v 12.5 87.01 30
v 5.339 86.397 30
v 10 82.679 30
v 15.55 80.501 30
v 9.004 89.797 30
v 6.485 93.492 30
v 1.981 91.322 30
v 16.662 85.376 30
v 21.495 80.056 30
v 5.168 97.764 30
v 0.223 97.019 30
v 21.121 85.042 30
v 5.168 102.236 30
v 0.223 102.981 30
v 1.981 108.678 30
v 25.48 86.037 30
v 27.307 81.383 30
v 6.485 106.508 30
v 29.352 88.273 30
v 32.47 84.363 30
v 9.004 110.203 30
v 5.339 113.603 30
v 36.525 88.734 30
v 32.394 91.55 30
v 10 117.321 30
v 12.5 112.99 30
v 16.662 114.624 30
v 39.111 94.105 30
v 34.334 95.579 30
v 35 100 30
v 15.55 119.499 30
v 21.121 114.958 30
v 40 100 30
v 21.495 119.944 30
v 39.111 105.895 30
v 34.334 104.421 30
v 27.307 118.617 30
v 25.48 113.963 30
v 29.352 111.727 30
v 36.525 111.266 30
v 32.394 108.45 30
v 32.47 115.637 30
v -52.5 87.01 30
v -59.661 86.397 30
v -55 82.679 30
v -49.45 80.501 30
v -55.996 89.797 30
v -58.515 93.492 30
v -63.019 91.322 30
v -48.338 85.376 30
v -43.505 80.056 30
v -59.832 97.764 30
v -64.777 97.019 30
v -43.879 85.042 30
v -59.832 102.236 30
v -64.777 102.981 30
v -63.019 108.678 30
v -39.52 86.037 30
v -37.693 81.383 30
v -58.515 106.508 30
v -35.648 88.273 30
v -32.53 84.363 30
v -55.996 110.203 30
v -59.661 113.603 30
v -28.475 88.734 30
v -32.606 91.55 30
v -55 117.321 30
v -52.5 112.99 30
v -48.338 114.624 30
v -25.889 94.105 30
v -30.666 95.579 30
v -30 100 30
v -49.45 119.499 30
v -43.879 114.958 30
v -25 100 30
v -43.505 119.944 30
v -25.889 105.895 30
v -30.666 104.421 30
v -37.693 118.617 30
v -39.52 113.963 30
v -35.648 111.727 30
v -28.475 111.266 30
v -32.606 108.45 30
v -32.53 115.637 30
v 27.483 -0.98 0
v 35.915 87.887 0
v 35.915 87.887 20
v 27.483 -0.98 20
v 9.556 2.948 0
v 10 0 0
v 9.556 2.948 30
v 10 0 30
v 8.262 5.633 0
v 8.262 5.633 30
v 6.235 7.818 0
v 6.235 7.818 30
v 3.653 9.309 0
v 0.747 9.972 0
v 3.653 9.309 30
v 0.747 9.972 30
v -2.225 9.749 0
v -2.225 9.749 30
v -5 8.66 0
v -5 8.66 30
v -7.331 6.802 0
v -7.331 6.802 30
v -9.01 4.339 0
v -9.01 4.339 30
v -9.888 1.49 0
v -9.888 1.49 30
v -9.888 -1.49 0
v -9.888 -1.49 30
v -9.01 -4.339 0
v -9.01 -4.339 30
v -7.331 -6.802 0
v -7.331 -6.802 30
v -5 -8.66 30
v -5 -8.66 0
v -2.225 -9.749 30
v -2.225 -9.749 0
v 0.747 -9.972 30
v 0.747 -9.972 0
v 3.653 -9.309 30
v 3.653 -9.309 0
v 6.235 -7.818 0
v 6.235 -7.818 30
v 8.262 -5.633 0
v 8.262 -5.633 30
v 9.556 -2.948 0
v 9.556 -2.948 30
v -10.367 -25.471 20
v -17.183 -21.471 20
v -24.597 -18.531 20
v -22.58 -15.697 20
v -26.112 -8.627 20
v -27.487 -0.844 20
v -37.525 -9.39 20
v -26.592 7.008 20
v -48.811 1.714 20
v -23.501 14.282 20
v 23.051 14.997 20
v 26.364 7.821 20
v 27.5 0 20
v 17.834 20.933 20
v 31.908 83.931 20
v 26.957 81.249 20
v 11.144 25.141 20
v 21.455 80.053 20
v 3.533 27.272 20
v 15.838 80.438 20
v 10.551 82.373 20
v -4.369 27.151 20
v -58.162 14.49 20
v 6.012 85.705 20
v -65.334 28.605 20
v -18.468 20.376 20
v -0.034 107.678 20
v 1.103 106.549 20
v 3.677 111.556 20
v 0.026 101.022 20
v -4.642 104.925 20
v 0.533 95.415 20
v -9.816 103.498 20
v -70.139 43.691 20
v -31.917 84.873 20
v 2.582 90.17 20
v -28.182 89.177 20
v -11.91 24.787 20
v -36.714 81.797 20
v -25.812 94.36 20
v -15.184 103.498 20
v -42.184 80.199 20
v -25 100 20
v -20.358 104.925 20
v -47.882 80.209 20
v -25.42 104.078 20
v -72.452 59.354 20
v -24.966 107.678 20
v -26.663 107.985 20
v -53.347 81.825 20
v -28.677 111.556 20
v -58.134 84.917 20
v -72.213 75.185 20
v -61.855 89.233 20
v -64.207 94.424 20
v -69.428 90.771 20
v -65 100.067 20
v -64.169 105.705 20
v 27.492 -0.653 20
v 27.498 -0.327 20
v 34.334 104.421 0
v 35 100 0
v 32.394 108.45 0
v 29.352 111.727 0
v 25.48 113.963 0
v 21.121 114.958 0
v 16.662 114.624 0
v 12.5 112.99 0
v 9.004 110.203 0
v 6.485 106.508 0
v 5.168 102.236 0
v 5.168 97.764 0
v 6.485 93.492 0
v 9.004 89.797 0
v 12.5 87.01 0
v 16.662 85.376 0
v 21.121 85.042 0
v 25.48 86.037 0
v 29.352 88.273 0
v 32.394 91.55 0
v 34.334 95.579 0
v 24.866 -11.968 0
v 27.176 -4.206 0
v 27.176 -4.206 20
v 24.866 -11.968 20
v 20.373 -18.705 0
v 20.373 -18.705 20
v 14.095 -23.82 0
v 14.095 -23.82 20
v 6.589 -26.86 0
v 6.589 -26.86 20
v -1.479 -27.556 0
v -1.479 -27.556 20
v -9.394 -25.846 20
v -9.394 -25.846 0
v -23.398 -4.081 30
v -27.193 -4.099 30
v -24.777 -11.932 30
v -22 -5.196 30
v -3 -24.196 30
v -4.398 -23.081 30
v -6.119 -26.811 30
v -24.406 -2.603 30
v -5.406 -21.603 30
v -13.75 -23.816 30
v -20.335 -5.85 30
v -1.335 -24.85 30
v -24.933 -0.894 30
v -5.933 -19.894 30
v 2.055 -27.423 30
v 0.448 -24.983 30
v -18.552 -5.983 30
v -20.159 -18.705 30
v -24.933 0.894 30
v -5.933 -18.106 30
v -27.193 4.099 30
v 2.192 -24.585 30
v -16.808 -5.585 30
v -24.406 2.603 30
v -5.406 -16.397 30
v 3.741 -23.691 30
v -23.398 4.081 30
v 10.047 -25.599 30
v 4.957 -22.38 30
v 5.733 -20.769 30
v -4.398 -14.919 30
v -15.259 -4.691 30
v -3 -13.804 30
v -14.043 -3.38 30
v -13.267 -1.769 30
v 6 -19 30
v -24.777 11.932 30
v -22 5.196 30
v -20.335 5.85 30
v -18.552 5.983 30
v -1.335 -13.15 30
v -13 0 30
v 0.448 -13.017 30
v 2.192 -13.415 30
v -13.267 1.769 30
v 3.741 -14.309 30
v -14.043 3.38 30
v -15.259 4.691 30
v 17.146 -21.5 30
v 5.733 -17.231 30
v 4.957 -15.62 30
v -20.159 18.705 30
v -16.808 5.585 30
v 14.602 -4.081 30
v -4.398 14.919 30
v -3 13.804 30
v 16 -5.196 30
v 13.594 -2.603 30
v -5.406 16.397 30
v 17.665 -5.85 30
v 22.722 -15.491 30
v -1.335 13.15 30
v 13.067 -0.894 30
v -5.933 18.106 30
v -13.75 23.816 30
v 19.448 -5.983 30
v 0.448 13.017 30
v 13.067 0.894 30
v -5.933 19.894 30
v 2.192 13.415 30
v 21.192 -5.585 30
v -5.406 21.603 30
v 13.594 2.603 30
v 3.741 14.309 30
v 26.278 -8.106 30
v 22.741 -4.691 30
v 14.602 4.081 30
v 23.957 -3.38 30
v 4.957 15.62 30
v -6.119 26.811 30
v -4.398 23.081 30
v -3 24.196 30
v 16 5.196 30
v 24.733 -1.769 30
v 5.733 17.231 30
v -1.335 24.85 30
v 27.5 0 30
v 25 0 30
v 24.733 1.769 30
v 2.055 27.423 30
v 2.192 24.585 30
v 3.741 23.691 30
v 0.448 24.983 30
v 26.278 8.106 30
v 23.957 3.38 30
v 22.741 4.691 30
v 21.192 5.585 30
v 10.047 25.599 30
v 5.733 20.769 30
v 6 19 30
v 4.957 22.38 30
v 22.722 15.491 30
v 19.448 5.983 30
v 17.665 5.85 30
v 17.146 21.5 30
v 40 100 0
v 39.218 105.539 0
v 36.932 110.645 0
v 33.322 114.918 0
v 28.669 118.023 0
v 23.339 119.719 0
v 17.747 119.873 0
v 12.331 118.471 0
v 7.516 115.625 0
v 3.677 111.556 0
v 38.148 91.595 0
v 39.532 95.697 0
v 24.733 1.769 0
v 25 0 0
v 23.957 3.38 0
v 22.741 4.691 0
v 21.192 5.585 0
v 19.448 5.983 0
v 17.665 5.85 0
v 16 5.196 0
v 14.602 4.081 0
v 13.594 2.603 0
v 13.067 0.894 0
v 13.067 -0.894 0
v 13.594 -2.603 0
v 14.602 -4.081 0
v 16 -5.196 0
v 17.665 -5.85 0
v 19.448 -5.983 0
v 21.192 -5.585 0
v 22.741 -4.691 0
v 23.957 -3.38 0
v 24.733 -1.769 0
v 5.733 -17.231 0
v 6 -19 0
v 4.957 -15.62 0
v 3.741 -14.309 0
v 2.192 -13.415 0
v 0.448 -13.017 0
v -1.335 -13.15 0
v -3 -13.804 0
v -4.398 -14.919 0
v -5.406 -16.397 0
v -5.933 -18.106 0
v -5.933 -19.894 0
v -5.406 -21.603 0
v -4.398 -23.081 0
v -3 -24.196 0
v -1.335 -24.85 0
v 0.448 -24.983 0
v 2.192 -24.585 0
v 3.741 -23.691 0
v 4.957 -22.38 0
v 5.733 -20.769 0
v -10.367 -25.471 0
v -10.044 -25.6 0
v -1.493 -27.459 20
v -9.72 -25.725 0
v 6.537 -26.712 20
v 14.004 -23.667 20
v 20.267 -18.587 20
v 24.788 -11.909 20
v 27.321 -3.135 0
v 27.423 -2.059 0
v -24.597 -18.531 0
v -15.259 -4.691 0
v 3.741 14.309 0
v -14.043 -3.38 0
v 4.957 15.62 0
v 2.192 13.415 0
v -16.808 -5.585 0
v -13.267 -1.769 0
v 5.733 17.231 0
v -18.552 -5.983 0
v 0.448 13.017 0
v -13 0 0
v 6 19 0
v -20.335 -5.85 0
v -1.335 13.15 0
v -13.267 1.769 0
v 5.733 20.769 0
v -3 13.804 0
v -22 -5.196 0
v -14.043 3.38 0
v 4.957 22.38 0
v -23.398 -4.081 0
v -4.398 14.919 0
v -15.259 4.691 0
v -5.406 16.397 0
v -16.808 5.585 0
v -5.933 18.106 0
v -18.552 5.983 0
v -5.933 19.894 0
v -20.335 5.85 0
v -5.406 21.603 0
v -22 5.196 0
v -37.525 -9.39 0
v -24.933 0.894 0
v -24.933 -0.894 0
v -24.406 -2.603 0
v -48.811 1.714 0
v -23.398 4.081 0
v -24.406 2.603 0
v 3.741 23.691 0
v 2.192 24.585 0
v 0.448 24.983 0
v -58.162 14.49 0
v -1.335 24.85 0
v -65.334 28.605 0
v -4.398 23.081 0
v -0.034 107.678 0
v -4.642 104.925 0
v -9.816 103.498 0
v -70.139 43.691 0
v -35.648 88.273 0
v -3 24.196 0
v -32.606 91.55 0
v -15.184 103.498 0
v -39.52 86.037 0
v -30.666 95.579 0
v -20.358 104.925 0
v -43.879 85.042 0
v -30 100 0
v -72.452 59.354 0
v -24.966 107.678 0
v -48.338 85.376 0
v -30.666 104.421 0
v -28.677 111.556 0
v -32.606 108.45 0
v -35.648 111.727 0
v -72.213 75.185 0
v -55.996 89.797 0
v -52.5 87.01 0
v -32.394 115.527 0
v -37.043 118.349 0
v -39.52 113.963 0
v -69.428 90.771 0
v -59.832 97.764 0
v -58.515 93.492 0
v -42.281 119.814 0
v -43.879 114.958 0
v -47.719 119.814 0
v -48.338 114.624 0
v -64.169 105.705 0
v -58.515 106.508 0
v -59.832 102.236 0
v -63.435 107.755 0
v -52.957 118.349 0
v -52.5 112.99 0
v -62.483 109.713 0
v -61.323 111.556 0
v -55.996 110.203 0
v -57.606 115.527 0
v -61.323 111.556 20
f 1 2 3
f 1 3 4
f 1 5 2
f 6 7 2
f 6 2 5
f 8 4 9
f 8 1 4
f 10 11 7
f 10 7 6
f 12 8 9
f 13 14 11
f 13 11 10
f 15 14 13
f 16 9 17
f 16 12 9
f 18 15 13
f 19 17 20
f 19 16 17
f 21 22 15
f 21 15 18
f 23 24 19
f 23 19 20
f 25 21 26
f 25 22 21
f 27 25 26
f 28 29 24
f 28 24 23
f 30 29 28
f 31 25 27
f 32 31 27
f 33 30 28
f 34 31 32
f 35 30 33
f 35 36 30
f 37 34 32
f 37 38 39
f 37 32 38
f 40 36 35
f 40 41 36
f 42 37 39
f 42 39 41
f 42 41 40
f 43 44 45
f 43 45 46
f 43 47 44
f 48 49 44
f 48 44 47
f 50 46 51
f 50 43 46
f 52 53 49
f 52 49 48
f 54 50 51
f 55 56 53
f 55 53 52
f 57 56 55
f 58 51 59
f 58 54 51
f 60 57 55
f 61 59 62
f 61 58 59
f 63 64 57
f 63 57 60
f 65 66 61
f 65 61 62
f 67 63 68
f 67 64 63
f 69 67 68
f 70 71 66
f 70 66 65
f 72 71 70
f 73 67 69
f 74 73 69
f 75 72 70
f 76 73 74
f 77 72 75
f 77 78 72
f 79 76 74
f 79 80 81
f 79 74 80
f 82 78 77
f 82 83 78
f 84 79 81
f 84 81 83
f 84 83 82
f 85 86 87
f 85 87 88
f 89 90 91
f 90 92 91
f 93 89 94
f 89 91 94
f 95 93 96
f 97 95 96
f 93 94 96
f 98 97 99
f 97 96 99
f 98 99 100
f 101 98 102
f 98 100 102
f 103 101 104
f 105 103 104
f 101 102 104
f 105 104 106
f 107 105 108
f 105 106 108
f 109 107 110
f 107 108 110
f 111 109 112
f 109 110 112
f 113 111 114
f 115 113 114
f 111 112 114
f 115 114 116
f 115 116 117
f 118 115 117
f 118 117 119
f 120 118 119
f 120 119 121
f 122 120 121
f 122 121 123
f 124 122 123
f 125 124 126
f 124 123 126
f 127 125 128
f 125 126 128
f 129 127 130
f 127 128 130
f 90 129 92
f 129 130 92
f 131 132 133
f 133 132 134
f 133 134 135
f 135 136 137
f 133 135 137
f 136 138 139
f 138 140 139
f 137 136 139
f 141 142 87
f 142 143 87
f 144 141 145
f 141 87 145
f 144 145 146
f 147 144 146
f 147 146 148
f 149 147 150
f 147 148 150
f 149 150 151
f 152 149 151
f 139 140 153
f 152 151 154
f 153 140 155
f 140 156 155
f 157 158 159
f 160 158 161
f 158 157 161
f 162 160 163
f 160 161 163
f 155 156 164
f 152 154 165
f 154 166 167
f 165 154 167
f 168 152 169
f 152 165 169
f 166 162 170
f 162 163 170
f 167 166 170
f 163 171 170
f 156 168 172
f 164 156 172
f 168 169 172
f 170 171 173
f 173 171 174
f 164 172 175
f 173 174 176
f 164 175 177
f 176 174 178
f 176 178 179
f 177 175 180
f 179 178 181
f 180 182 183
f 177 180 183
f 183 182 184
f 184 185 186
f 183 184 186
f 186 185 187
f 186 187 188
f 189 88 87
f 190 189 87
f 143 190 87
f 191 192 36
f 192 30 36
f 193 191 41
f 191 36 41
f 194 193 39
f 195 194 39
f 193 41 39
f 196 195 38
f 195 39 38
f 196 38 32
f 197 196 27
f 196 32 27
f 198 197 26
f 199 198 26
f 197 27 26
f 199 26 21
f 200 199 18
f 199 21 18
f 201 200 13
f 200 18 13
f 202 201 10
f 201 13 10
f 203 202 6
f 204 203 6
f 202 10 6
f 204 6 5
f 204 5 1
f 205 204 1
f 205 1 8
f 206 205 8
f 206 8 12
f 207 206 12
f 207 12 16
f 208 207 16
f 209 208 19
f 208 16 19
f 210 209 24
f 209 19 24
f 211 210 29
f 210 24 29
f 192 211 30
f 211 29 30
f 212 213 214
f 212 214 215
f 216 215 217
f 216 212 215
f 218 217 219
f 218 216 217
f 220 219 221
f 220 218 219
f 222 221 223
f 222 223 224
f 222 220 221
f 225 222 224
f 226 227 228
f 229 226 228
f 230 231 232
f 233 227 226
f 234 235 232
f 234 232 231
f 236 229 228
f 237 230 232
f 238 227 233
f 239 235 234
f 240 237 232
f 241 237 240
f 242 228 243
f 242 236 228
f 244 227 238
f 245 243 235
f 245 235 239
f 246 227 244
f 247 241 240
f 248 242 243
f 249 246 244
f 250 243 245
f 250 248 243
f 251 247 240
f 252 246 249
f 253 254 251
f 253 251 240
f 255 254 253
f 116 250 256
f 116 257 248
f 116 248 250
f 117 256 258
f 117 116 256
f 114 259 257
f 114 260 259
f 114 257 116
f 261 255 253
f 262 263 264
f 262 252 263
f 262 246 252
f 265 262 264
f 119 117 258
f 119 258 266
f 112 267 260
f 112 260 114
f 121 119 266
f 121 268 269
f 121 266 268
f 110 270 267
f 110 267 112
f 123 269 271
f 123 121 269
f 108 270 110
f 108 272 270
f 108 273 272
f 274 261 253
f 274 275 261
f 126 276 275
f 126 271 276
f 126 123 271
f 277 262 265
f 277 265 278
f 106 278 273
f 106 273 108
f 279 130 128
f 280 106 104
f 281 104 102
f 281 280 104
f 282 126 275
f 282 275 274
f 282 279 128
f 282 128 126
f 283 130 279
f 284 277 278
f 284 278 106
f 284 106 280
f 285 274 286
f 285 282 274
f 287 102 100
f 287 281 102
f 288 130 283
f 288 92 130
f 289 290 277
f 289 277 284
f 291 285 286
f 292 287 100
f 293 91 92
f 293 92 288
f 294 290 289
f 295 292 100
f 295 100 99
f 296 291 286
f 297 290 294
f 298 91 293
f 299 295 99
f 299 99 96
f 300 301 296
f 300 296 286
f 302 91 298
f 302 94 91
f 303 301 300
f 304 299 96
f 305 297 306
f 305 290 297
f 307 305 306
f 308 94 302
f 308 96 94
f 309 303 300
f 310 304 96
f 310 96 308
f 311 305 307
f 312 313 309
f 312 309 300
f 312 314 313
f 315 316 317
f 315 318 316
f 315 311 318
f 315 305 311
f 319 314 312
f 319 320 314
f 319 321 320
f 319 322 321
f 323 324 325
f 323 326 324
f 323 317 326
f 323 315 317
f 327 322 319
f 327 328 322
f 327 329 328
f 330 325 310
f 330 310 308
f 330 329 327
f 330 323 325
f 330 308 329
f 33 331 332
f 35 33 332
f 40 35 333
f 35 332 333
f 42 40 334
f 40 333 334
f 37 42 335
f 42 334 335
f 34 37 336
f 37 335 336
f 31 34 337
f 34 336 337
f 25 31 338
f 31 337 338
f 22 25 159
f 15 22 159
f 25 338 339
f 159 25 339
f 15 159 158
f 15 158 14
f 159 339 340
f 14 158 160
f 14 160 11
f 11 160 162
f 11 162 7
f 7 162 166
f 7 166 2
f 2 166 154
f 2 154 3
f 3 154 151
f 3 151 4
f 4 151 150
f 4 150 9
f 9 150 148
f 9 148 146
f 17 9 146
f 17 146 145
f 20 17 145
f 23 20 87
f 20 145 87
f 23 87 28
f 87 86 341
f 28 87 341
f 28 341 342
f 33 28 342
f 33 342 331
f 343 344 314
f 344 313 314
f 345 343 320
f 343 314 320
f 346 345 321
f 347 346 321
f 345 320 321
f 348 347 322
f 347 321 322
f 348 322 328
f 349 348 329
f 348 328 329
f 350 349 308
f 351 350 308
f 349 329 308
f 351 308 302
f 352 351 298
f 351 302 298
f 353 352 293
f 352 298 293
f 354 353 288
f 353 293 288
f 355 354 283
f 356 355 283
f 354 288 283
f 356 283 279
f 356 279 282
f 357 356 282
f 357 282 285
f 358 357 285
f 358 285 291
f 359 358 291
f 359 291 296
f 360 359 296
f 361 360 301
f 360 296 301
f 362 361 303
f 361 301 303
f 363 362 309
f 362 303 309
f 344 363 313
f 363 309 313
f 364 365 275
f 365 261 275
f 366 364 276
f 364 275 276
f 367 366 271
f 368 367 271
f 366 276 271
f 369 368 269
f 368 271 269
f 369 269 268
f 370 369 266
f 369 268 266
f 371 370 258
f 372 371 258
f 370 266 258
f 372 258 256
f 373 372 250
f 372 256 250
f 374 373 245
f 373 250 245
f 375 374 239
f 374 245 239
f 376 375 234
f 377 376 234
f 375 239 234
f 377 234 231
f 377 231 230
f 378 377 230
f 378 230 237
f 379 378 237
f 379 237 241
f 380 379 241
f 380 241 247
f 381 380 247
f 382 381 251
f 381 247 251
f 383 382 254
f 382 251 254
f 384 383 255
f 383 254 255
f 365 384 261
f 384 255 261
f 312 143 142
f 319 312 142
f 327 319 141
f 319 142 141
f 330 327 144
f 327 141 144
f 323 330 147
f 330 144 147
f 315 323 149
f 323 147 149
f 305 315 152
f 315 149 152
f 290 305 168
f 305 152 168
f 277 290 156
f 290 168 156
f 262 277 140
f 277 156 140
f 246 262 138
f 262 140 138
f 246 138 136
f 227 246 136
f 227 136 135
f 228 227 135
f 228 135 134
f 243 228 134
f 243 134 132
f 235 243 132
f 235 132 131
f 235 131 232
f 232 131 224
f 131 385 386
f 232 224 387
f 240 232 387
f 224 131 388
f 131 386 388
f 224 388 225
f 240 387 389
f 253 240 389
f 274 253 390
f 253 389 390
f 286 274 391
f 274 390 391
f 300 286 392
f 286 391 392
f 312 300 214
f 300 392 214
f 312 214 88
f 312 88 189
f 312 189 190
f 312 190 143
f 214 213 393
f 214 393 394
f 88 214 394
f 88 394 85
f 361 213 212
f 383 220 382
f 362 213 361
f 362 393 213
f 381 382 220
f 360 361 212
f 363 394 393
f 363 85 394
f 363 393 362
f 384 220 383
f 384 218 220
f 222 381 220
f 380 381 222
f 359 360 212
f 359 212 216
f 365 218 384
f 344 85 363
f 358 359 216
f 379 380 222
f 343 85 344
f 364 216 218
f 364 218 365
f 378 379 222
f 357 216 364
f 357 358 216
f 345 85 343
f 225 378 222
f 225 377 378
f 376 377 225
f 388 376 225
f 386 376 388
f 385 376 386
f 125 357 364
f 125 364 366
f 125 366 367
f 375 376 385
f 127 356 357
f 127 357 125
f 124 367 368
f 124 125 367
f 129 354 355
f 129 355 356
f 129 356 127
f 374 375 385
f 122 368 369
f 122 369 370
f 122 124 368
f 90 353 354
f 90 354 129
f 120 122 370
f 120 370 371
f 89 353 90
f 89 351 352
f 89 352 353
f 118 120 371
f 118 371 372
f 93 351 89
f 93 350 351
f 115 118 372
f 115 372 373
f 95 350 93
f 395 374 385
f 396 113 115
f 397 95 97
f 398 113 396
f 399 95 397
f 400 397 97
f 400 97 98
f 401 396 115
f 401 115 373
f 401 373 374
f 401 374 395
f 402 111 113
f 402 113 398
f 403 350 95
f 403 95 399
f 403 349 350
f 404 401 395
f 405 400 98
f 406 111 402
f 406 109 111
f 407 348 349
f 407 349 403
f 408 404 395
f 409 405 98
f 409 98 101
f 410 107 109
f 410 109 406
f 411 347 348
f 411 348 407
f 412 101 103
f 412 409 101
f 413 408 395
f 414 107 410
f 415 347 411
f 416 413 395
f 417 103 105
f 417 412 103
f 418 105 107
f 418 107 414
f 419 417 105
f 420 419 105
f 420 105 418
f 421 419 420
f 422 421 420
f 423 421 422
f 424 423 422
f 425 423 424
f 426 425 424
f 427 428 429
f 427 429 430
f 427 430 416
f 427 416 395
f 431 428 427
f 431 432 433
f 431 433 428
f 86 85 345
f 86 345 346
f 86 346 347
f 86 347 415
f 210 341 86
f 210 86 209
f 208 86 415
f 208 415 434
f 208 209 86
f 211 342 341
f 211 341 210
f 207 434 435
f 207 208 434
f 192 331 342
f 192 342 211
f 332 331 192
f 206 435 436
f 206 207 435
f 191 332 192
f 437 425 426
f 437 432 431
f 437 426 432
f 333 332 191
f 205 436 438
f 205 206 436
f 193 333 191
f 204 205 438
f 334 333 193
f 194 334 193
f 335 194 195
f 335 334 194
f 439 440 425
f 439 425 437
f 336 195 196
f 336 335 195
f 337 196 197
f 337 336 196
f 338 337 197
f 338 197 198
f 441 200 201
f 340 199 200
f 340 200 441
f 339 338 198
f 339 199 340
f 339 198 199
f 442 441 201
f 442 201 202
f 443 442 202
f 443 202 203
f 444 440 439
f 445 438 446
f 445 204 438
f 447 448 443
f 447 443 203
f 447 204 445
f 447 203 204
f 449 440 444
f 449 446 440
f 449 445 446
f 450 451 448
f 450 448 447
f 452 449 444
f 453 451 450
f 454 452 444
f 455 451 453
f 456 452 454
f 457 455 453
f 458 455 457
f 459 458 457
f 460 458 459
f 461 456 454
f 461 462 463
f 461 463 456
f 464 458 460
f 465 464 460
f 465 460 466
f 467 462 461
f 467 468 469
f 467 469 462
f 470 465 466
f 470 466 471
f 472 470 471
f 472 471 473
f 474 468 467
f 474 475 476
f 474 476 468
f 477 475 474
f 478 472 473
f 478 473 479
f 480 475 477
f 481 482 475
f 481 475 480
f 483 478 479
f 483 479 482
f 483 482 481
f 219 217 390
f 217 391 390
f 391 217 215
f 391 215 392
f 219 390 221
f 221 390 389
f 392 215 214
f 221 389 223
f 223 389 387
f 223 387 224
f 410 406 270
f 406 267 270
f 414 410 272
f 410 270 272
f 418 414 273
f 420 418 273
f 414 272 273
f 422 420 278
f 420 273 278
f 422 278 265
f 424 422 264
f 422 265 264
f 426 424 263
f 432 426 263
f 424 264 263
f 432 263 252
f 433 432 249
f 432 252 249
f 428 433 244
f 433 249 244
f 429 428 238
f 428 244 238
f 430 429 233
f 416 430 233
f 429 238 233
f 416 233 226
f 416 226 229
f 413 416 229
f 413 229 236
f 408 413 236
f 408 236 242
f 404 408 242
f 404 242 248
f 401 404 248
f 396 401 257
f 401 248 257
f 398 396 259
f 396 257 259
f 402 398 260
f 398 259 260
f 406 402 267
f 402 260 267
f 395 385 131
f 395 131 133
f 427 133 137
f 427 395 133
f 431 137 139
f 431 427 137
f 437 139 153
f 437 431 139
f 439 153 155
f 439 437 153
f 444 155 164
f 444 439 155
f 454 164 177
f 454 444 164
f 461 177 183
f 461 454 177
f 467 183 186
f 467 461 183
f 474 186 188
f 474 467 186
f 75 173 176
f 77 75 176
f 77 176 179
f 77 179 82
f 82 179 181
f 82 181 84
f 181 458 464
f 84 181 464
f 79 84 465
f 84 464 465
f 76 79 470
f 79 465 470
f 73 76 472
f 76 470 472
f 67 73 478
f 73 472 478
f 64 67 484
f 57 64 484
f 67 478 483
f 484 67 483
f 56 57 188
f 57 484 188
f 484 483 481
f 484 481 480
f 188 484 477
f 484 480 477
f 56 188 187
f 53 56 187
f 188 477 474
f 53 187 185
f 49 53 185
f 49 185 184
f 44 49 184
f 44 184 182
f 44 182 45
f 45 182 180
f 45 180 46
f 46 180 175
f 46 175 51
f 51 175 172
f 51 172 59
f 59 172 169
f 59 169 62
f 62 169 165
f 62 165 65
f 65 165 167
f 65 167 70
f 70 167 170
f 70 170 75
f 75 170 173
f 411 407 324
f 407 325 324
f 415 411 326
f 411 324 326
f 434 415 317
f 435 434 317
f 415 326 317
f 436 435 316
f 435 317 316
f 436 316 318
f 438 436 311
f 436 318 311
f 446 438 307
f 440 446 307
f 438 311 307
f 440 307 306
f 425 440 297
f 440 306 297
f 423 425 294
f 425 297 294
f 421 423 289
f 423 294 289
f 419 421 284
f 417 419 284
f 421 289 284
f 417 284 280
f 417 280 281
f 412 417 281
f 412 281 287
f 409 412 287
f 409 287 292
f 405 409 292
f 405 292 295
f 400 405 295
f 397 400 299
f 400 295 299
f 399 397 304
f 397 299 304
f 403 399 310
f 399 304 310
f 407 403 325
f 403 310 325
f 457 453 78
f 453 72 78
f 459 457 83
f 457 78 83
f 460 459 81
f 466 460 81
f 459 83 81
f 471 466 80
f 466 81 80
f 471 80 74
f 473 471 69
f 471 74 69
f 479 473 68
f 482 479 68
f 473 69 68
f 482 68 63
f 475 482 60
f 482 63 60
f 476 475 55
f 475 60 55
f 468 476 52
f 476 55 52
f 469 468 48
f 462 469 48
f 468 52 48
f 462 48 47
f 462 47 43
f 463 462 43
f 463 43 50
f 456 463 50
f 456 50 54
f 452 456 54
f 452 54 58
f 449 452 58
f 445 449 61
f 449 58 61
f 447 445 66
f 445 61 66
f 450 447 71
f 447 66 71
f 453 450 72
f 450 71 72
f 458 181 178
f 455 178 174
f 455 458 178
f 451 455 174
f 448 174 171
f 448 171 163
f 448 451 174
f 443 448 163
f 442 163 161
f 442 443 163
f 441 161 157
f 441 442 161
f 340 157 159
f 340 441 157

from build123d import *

# Parameters (mm, degrees)
SKETCH1_R               = 27.5
SKETCH1_R_2             = 19
SKETCH1_R_3             = 10
BOSS_EXTRUDE1_DEPTH     = 30
SKETCH2_R               = 20
SKETCH2_R_2             = 15
BOSS_EXTRUDE2_DEPTH     = 30
BOSS_EXTRUDE2_2_DEPTH   = 30
SKETCH5_R               = 6
CUT_EXTRUDE1_DEPTH      = 30
BOSS_EXTRUDE3_DEPTH     = 20
SKETCH7_R               = 15
SKETCH7_R_2             = 6
SKETCH7_R_3             = 10
CUT_EXTRUDE2_DEPTH      = 11
CUT_EXTRUDE2_DEPTH_BACK = 21


with BuildPart() as part:
    # Sketch1 → Boss-Extrude1 (new body)
    with BuildSketch(Plane.XY):
        Circle(SKETCH1_R)
        Circle(SKETCH1_R_2, mode=Mode.SUBTRACT)
        Circle(SKETCH1_R_2)
        Circle(SKETCH1_R_3, mode=Mode.SUBTRACT)
    extrude(amount=BOSS_EXTRUDE1_DEPTH)

    # Sketch5 → Cut-Extrude1 (cut)
    with BuildSketch(Plane.XY):
        with Locations((0, 19)):
            Circle(SKETCH5_R)
        with Locations((-19, 0)):
            Circle(SKETCH5_R)
        with Locations((0, -19)):
            Circle(SKETCH5_R)
        with Locations((19, 0)):
            Circle(SKETCH5_R)
    extrude(amount=CUT_EXTRUDE1_DEPTH, mode=Mode.SUBTRACT)



with BuildPart() as body_2:
    # Sketch2 → Boss-Extrude2 (new body)
    with BuildSketch(Plane.XY):
        with Locations((-45, 100)):
            Circle(SKETCH2_R)
        with Locations((-45, 100)):
            Circle(SKETCH2_R_2, mode=Mode.SUBTRACT)
    extrude(amount=BOSS_EXTRUDE2_DEPTH)


with BuildPart() as body_3:
    # Sketch2 → Boss-Extrude2 2 (new body)
    with BuildSketch(Plane.XY):
        with Locations((20, 100)):
            Circle(SKETCH2_R)
        with Locations((20, 100)):
            Circle(SKETCH2_R_2, mode=Mode.SUBTRACT)
    extrude(amount=BOSS_EXTRUDE2_2_DEPTH)


with BuildPart() as part_1:
    add(part.part)

    add(body_2.part)  # Boss-Extrude3 merges body 2

    add(body_3.part)  # Boss-Extrude3 merges body 3
    # Sketch6 → Boss-Extrude3 (add)
    with BuildSketch(Plane.XY):
        with BuildLine():
            Line((35.914568173, 87.886927728), (27.176428779, -4.206152493))
            ThreePointArc((27.176428779, -4.206152493), (14.094792579, -23.82005481), (-9.394166008, -25.845689099))
            ThreePointArc((-9.394166008, -25.845689099), (-66.335656198, 31.148009393), (-61.323361203, 111.556291751))
            ThreePointArc((-61.323361203, 111.556291751), (-45, 119.870223993), (-28.676638797, 111.556291751))
            ThreePointArc((-28.676638797, 111.556291751), (-12.5, 103.317089225), (3.676638797, 111.556291751))
            ThreePointArc((3.676638797, 111.556291751), (31.685854827, 115.916260455), (35.914568173, 87.886927728))
        make_face()
    extrude(amount=BOSS_EXTRUDE3_DEPTH)

    # Sketch7 → Cut-Extrude2 (cut, two sides)
    with BuildSketch(Plane.XY.offset(20)) as cut_extrude2_sk:
        with Locations((-45, 100)):
            Circle(SKETCH7_R)
        with Locations((20, 100)):
            Circle(SKETCH7_R)
        with Locations((0, 19)):
            Circle(SKETCH7_R_2)
        with Locations((-19, 0)):
            Circle(SKETCH7_R_2)
        with Locations((0, -19)):
            Circle(SKETCH7_R_2)
        with Locations((19, 0)):
            Circle(SKETCH7_R_2)
        Circle(SKETCH7_R_3)
    extrude(amount=CUT_EXTRUDE2_DEPTH, mode=Mode.SUBTRACT)
    extrude(cut_extrude2_sk.sketch, amount=-CUT_EXTRUDE2_DEPTH_BACK, mode=Mode.SUBTRACT)


solid = part_1.part
